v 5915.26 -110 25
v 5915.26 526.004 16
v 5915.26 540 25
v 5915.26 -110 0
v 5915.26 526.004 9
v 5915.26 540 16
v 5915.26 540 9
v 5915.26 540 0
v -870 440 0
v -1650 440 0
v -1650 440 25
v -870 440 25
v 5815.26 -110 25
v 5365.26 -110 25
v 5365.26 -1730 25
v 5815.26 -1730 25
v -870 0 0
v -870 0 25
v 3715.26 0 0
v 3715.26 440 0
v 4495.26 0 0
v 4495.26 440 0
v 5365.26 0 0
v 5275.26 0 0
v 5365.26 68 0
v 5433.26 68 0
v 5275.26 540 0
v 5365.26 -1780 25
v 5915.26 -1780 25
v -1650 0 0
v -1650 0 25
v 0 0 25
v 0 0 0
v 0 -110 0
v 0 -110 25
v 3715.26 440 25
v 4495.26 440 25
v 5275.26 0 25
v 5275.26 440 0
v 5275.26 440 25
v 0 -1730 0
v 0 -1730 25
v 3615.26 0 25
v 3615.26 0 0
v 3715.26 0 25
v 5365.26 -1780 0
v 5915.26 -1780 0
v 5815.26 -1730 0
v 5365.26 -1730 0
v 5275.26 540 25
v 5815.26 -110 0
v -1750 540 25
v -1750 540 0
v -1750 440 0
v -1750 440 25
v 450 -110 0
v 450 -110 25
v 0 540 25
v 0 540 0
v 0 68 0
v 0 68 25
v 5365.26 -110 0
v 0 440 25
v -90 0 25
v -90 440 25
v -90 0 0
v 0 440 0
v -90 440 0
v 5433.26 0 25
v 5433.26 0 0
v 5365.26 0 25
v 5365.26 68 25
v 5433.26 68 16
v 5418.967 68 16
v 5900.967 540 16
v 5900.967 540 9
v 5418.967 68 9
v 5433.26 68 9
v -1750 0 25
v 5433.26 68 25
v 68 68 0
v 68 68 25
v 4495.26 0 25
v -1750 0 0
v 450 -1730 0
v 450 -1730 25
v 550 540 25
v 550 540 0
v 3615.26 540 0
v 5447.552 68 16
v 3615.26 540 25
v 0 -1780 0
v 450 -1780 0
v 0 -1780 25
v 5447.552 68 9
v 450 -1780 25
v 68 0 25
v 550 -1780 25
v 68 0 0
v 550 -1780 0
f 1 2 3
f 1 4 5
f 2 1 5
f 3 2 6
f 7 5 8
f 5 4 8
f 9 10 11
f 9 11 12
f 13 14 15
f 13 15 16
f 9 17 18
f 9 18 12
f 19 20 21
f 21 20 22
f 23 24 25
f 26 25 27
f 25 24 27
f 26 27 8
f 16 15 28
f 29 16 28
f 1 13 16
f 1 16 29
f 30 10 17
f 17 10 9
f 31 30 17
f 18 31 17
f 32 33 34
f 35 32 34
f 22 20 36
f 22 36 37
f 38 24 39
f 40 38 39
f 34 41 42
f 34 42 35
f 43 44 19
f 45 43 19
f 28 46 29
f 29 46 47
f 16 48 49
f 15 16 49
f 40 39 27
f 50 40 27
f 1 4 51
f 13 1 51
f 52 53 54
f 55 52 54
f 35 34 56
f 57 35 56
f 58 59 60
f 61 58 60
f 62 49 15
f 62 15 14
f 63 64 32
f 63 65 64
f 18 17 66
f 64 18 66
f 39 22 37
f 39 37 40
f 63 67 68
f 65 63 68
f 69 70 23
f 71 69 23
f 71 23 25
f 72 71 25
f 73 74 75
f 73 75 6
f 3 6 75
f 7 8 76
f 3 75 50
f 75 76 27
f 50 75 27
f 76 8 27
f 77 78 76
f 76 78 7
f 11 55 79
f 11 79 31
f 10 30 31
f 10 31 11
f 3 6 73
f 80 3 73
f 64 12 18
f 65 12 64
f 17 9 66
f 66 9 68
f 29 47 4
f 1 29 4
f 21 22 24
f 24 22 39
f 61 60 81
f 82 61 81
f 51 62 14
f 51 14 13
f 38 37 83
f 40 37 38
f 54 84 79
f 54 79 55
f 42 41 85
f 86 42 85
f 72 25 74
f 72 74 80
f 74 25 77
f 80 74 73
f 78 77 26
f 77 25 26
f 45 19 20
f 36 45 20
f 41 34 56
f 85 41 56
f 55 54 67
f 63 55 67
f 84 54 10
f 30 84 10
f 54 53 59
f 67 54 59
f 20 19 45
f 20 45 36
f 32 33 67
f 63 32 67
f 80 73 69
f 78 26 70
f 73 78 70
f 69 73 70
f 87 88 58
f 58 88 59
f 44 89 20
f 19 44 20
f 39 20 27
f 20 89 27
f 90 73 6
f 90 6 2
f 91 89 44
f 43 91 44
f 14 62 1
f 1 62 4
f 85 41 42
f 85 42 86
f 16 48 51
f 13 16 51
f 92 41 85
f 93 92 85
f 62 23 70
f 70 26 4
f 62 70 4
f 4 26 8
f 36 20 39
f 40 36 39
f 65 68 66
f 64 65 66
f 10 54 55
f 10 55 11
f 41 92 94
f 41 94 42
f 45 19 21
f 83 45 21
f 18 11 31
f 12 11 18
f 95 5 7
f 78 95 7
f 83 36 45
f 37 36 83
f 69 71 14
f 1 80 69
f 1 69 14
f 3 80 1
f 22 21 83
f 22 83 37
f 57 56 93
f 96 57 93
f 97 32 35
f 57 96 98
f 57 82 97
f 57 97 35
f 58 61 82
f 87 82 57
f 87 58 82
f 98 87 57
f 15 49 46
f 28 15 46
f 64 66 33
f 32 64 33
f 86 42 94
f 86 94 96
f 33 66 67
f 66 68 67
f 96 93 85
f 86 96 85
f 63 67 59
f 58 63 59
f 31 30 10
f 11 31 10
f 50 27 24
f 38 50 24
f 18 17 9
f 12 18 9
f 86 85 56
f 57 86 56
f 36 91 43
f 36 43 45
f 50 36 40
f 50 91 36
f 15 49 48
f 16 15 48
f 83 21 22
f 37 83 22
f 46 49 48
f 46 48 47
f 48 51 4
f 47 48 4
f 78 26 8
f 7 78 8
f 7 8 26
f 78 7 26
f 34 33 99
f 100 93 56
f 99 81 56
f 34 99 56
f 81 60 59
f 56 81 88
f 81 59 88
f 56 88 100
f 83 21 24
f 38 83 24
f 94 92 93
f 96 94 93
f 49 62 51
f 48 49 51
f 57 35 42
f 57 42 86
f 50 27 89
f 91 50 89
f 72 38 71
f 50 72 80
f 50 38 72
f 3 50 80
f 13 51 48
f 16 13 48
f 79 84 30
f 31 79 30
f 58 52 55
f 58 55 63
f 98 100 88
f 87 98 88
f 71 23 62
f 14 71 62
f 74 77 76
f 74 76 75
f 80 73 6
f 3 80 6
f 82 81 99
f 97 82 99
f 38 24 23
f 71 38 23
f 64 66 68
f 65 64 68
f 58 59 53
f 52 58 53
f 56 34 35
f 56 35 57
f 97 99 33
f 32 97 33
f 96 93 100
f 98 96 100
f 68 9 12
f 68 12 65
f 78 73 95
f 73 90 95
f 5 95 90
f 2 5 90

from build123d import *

# Parameters (mm, degrees)
F0_W     = 100
F0_H     = 440
F1_DEPTH = 25
F0_W_2   = 780
F0_W_3   = 450
F0_H_2   = 50
F2_DEPTH = 25
F0_H_3   = 1620
F3_DEPTH = 25
F4_DEPTH = 25
F6_W     = 10
F6_H     = 7
F7_REACH = 7112.0815171795


with BuildPart() as f1:
    # F0 (on Top) → F1 (new body)
    with BuildSketch(Plane.XY):
        with Locations((-1700, 220)):
            Rectangle(F0_W, F0_H)
    extrude(amount=F1_DEPTH)


with BuildPart() as f1b:
    # F0 (on Top) → F1, piece 2 (new body)
    with BuildSketch(Plane.XY):
        with Locations((-480, 220)):
            Rectangle(F0_W_2, F0_H)
    extrude(amount=F1_DEPTH)


with BuildPart() as f1c:
    # F0 (on Top) → F1, piece 3 (new body)
    with BuildSketch(Plane.XY):
        with Locations((225, -1755)):
            Rectangle(F0_W_3, F0_H_2)
    extrude(amount=F1_DEPTH)


with BuildPart() as f1d:
    # F0 (on Top) → F1, piece 4 (new body)
    with BuildSketch(Plane.XY):
        Polygon((4495.2596473694, 440.0000286102), (5275.2596473694, 440.0000286102), (5275.2596473694, 540.0000286102), (3615.2596473694, 540.0000286102), (3615.2596473694, 2.86102e-05), (3715.2596473694, 2.86102e-05), (3715.2596473694, 440.0000286102), align=None)
    extrude(amount=F1_DEPTH)


with BuildPart() as f1e:
    # F0 (on Top) → F1, piece 5 (new body)
    with BuildSketch(Plane.XY):
        Polygon((5433.2596473694, 2.86102e-05), (5365.2596473694, 2.86102e-05), (5365.2596473694, -109.9999713898), (5815.2596473694, -109.9999713898), (5915.2596473694, -109.9999713898), (5915.2596473694, 540.0000286102), (5433.2596473694, 68.0000286102), align=None)
    extrude(amount=F1_DEPTH)


with BuildPart() as f2:
    # F0 (on Top) → F2 (new body)
    with BuildSketch(Plane.XY):
        Polygon((550, -110), (450, -110), (450, -1730), (450, -1780), (550, -1780), align=None)
        Polygon((68, 0), (0, 0), (0, -110), (450, -110), (550, -110), (550, 540), (0, 540), (0, 440), (0, 68), (68, 68), align=None)
    extrude(amount=F2_DEPTH)


with BuildPart() as f2b:
    # F0 (on Top) → F2, piece 2 (new body)
    with BuildSketch(Plane.XY):
        with Locations((-1260, 220)):
            Rectangle(F0_W_2, F0_H)
    extrude(amount=F2_DEPTH)


with BuildPart() as f2c:
    # F0 (on Top) → F2, piece 3 (new body)
    with BuildSketch(Plane.XY):
        with Locations((4105.2596473694, 220.0000286102)):
            Rectangle(F0_W_2, F0_H)
    extrude(amount=F2_DEPTH)


with BuildPart() as f2d:
    # F0 (on Top) → F2, piece 4 (new body)
    with BuildSketch(Plane.XY):
        Polygon((5275.2596473694, 2.86102e-05), (5365.2596473694, 2.86102e-05), (5365.2596473694, 68.0000286102), (5433.2596473694, 68.0000286102), (5915.2596473694, 540.0000286102), (5275.2596473694, 540.0000286102), (5275.2596473694, 440.0000286102), align=None)
    extrude(amount=F2_DEPTH)


with BuildPart() as f2e:
    # F0 (on Top) → F2, piece 5 (new body)
    with BuildSketch(Plane.XY):
        with Locations((5590.2596473694, -919.9999713898)):
            Rectangle(F0_W_3, F0_H_3)
    extrude(amount=F2_DEPTH)


with BuildPart() as f3:
    # F0 (on Top) → F3 (new body)
    with BuildSketch(Plane.XY):
        with Locations((225, -920)):
            Rectangle(F0_W_3, F0_H_3)
    extrude(amount=F3_DEPTH)


with BuildPart() as f3b:
    # F0 (on Top) → F3, piece 2 (new body)
    with BuildSketch(Plane.XY):
        Polygon((-90, 440), (0, 440), (0, 540), (-1750, 540), (-1750, 440), (-1650, 440), (-870, 440), align=None)
    extrude(amount=F3_DEPTH)


with BuildPart() as f3c:
    # F0 (on Top) → F3, piece 3 (new body)
    with BuildSketch(Plane.XY):
        Polygon((5915.2596473694, -109.9999713898), (5815.2596473694, -109.9999713898), (5815.2596473694, -1729.9999713898), (5365.2596473694, -1729.9999713898), (5365.2596473694, -1779.9999713898), (5915.2596473694, -1779.9999713898), align=None)
    extrude(amount=F3_DEPTH)


with BuildPart() as f3d:
    # F0 (on Top) → F3, piece 4 (new body)
    with BuildSketch(Plane.XY):
        with Locations((4885.2596473694, 220.0000286102)):
            Rectangle(F0_W_2, F0_H)
    extrude(amount=F3_DEPTH)


with BuildPart() as f4:
    # F0 (on Top) → F4 (new body)
    with BuildSketch(Plane.XY):
        Polygon((-90, 0), (0, 0), (0, 68), (0, 440), (-90, 440), align=None)
    extrude(amount=F4_DEPTH)


with BuildPart() as f7:
    f7_end = Plane(origin=(5399.2596473694, 68.0000286102, 12.5), x_dir=(0, 0, -1), z_dir=(0, -1, 0))
    # F6 (on face) → F7 (new body, up to a plane its end follows)
    with BuildSketch(Plane(origin=(3289.5685174165, 3221.3202079265, 0), x_dir=(-0.6996563237, 0.7144795509, 0), z_dir=(0.7144795509, 0.6996563237, 0))):
        with Locations((-3747.8298407898, 12.5)):
            Rectangle(F6_W, F6_H)
        with Locations((-3757.8298407898, 12.5)):
            Rectangle(F6_W, F6_H)
    f7_long = extrude(amount=-F7_REACH, mode=Mode.PRIVATE)
    add(split(f7_long, bisect_by=f7_end, keep=Keep.BOTTOM, mode=Mode.PRIVATE))


with BuildPart() as f2d_1:
    add(f2d.part)

    # F8: cut F7
    add(f7.part, mode=Mode.SUBTRACT)


with BuildPart() as f1e_1:
    add(f1e.part)

    # F8: cut F7
    add(f7.part, mode=Mode.SUBTRACT)


solid = Compound([f1.part, f1b.part, f1c.part, f1d.part, f2.part, f2b.part, f2c.part, f2e.part, f3.part, f3b.part, f3c.part, f3d.part, f4.part, f2d_1.part, f1e_1.part])
